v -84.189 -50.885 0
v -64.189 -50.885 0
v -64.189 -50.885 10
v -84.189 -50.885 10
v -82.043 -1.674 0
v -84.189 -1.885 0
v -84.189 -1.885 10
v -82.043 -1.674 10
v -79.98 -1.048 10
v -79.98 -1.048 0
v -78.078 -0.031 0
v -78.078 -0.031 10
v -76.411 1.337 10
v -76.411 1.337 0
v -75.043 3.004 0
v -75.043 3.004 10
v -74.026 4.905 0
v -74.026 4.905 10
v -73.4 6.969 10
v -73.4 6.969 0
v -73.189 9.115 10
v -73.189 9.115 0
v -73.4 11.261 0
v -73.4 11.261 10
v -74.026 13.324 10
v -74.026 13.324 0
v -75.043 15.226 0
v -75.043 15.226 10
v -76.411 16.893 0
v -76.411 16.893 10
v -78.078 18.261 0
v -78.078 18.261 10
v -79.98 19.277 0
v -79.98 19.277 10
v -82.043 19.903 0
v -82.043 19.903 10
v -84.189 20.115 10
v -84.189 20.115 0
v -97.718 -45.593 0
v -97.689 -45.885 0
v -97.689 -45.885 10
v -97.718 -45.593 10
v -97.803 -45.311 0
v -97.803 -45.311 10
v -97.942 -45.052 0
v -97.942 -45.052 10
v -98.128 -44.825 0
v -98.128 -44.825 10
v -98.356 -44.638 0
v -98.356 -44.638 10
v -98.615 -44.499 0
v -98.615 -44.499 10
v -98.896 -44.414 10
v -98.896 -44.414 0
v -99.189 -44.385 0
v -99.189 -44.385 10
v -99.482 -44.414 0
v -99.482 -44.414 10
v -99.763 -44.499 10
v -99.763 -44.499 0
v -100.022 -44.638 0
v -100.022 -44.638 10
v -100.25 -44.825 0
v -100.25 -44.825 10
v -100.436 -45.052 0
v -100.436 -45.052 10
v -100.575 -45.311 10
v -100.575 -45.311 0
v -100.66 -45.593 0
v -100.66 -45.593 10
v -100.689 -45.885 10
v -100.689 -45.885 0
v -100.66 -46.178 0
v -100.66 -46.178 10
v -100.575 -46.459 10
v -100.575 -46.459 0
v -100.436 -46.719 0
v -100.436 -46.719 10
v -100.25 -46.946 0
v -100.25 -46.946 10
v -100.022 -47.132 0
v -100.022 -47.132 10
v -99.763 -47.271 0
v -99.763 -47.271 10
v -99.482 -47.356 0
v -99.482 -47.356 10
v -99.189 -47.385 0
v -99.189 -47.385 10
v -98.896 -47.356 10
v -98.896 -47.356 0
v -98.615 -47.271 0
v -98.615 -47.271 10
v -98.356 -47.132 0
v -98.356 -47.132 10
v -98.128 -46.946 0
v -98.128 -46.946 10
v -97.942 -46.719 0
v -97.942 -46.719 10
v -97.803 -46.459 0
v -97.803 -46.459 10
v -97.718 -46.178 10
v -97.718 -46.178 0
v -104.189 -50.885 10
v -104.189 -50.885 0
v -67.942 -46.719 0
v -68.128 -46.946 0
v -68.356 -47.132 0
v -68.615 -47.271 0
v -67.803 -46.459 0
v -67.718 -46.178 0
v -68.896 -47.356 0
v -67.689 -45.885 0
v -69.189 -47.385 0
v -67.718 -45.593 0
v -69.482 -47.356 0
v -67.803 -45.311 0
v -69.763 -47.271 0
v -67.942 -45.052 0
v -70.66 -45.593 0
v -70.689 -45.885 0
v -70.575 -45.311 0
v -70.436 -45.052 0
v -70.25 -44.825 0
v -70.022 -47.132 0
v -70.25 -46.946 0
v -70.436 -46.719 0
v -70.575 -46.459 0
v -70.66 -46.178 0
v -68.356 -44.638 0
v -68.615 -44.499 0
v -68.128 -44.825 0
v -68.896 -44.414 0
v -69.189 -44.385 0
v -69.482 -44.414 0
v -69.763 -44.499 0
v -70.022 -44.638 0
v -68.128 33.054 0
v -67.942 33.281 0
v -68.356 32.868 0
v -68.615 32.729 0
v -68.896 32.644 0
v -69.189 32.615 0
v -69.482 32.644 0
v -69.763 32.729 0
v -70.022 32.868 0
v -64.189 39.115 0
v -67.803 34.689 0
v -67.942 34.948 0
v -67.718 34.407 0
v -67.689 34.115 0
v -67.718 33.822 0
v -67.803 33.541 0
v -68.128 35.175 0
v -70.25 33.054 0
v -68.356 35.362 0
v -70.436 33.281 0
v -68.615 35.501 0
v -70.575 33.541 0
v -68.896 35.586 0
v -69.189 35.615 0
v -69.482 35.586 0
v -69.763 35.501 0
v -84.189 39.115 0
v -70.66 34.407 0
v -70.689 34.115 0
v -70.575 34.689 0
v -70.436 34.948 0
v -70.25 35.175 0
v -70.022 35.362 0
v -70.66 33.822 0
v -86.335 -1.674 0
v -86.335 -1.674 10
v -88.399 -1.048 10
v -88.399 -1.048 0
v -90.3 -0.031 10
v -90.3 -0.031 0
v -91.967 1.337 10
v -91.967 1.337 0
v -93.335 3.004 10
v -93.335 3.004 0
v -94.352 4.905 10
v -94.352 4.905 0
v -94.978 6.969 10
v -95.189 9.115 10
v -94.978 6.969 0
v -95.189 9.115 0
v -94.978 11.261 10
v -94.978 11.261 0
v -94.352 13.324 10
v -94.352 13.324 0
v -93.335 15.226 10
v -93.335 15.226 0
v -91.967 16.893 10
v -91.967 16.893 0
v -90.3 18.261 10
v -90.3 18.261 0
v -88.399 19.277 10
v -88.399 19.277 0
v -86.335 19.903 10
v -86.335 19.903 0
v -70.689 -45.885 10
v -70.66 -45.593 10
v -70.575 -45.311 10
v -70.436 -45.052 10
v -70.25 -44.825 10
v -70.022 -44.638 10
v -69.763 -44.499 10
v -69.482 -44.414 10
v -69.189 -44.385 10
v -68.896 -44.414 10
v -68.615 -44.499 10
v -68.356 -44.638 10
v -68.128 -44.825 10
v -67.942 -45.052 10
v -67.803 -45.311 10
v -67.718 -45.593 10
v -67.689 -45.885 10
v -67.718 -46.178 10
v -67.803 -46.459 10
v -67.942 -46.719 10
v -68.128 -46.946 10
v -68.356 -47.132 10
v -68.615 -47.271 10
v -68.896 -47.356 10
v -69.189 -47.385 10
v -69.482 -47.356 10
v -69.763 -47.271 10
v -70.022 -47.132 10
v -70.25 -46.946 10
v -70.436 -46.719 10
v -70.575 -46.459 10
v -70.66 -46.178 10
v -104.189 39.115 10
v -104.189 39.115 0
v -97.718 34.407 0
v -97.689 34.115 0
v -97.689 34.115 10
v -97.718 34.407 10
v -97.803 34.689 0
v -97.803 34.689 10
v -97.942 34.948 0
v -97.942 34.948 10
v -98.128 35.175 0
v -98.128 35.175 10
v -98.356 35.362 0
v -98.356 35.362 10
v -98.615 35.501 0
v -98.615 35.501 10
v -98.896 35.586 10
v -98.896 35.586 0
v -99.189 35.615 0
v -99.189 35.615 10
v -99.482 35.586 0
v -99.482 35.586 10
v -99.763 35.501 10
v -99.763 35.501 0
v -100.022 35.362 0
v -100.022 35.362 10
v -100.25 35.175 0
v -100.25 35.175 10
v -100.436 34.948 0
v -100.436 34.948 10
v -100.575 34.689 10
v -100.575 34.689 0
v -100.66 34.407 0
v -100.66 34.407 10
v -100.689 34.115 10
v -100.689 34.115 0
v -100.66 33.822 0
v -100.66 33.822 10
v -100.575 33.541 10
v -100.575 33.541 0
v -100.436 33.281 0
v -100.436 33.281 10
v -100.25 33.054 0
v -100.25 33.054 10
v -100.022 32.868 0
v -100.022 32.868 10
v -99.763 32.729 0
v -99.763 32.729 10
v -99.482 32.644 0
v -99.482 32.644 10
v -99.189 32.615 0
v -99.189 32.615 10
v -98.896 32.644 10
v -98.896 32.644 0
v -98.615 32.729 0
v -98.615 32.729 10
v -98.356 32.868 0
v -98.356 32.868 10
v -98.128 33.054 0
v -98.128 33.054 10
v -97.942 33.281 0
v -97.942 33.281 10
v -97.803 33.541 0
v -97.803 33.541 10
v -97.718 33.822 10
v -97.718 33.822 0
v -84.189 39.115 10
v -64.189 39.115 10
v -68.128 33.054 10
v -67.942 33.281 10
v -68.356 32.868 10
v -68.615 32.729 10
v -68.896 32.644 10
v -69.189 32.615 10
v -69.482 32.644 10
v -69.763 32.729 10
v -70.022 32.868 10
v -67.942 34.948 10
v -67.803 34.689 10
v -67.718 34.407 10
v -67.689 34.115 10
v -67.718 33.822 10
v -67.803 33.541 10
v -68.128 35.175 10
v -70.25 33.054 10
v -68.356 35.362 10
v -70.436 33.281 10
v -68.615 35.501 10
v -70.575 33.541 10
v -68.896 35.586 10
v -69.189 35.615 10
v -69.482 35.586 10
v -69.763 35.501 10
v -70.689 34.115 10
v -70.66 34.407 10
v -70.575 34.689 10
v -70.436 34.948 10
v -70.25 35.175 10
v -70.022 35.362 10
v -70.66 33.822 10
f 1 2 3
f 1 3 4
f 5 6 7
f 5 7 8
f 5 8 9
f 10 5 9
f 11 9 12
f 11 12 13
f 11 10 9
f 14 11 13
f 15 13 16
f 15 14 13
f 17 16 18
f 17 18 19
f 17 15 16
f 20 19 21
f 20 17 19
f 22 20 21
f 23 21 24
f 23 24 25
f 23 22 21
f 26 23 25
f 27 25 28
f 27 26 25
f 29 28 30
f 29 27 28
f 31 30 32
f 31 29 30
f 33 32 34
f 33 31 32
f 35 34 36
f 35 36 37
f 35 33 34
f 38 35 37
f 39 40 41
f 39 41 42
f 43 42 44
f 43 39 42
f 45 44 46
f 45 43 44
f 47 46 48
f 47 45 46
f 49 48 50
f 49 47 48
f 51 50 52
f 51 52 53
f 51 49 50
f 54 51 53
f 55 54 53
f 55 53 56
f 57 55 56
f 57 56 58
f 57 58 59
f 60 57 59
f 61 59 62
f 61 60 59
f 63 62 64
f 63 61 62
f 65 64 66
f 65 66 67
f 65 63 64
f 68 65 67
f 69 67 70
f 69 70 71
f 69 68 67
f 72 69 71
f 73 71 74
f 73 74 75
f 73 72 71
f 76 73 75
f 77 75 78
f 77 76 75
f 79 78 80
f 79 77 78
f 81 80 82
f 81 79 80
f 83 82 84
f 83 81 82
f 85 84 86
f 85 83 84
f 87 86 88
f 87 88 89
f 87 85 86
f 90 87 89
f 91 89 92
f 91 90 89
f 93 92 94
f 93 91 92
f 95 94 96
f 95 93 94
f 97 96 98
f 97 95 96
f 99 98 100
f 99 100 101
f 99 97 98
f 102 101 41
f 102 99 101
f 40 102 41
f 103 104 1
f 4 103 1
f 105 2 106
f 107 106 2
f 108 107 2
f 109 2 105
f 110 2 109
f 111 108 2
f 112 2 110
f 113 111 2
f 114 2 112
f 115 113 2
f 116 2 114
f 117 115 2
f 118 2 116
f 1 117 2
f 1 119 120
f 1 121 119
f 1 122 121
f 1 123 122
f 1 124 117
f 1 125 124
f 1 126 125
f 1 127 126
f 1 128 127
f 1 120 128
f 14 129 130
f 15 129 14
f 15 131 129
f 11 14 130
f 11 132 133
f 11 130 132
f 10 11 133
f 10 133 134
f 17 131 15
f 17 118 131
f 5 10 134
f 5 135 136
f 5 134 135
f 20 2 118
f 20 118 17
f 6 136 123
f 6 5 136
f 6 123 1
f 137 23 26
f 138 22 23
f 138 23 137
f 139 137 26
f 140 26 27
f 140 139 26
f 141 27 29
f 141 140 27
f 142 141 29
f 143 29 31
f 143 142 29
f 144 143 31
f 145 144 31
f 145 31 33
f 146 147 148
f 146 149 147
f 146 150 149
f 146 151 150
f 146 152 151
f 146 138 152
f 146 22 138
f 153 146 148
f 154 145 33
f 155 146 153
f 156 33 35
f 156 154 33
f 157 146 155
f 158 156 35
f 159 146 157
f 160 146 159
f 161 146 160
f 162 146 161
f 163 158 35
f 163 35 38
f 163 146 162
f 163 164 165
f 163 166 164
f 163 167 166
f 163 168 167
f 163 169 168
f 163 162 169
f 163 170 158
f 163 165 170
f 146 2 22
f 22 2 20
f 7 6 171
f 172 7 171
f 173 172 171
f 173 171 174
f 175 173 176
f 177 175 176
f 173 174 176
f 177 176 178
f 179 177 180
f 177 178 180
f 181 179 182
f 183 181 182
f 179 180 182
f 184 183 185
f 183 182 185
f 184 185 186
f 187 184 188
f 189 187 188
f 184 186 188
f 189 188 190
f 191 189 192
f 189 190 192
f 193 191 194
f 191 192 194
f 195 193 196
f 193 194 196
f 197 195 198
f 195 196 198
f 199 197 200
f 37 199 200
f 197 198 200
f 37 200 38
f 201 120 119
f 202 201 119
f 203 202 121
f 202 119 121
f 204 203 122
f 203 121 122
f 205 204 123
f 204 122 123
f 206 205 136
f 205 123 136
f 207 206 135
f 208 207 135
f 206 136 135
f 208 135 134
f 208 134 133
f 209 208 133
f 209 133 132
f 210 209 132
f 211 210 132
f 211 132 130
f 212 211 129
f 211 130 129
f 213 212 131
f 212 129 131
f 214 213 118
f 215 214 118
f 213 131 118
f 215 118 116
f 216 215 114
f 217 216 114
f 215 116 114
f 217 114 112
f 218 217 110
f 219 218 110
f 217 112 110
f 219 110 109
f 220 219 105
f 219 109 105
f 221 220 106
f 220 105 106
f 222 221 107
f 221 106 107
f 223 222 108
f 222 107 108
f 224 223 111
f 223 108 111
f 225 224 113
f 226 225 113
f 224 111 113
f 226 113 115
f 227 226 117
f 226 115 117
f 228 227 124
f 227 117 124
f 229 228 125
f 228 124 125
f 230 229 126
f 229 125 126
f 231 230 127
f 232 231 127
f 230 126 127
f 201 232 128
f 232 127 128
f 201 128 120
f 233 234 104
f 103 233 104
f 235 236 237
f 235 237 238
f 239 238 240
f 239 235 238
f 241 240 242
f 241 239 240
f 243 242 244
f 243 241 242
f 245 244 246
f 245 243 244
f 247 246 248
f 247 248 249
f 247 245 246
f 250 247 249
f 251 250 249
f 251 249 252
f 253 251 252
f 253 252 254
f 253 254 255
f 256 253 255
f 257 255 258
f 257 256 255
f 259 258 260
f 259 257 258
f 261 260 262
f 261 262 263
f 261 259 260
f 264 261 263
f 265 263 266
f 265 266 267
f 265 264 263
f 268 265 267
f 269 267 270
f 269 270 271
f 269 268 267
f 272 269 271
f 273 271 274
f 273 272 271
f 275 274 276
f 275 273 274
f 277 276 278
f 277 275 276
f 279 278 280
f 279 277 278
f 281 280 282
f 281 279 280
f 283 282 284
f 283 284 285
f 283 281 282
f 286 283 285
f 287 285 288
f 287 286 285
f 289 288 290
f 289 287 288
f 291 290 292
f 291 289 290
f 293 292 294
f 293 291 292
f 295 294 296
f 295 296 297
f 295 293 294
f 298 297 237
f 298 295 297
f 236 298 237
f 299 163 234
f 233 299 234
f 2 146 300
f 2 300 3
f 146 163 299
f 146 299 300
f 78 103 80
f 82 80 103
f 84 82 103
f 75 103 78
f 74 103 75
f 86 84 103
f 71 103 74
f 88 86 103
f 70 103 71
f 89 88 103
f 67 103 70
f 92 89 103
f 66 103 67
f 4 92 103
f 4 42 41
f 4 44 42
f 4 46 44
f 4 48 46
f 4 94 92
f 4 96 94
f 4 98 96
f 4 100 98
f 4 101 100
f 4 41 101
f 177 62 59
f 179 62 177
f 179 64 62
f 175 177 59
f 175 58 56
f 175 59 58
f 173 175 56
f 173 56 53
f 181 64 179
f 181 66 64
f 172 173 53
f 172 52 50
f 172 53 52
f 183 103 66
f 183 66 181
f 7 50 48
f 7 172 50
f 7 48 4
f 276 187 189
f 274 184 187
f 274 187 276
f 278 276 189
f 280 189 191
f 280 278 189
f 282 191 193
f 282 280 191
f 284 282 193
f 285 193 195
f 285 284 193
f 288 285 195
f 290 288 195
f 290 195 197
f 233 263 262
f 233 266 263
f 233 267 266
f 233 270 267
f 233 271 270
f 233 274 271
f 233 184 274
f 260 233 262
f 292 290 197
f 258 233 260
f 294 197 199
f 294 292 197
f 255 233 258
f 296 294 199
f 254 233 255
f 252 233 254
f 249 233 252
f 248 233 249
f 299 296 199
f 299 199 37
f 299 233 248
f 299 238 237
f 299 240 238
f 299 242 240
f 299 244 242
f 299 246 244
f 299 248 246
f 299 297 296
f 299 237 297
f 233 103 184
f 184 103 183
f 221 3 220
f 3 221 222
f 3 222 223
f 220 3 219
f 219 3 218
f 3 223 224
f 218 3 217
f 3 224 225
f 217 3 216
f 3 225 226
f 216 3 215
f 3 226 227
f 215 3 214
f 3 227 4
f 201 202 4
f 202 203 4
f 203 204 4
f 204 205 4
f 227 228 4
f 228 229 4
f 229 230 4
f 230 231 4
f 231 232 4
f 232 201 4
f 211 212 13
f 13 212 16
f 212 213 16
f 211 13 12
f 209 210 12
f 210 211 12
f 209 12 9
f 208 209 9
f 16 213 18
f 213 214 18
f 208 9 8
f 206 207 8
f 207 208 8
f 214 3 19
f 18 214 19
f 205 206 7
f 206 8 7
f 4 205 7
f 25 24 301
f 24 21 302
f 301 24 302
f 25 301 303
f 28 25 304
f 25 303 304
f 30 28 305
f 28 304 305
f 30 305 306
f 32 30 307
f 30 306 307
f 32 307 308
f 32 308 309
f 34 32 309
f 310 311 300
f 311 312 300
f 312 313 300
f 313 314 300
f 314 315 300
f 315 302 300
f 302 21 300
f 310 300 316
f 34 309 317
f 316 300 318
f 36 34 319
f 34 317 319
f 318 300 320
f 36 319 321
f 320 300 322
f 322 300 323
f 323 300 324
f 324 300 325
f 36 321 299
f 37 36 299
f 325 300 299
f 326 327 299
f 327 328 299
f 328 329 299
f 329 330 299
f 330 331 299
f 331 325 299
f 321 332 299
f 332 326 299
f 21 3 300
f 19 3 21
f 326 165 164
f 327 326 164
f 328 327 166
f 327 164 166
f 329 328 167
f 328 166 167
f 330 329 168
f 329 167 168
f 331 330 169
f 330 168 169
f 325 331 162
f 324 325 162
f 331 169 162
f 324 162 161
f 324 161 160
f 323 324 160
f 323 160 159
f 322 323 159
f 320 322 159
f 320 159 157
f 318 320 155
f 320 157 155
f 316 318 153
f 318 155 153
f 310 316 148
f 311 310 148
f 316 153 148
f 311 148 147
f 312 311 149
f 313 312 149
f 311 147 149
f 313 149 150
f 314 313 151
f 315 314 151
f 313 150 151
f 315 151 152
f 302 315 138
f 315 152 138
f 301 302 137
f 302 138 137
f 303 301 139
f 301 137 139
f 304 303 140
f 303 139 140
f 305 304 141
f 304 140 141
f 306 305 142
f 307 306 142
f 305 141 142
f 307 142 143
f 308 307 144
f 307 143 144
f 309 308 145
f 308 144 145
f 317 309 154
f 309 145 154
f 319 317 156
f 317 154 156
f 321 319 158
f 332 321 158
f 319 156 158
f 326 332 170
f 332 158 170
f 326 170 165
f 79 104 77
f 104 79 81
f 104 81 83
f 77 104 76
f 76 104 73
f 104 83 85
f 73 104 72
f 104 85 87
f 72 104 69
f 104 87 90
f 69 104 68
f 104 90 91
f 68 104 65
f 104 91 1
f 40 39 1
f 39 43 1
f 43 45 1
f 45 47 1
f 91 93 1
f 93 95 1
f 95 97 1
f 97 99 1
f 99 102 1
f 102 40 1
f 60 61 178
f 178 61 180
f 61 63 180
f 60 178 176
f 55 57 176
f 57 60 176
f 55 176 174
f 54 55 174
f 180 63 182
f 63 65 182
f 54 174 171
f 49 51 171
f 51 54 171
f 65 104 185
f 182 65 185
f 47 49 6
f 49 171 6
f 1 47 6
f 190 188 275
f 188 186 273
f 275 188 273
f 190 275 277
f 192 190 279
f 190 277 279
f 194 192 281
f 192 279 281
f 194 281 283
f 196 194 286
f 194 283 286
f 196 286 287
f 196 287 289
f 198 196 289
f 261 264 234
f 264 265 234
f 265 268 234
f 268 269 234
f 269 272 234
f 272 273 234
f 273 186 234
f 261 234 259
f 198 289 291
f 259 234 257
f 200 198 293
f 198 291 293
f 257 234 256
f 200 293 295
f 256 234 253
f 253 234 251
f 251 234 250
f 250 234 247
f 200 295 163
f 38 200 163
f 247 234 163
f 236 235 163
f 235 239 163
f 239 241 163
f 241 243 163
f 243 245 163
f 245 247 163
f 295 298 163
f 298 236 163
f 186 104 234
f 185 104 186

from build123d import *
from build123d.topology import SkipClean

# Parameters (mm, degrees)
SKETCH1_R           = 1.5
BOSS_EXTRUDE1_DEPTH = 10


with BuildPart() as part:
    # Sketch1 → Boss-Extrude1 (new body)
    with BuildSketch(Plane.XY):
        with BuildLine():
            Line((-104.189078903, 39.114814762), (-104.189078903, -50.885185238))
            Line((-104.189078903, -50.885185238), (-84.189078903, -50.885185238))
            Line((-84.189078903, -50.885185238), (-84.189078903, -1.885185238))
            ThreePointArc((-84.189078903, -1.885185238), (-95.189078903, 9.114814762), (-84.189078903, 20.114814762))
            Line((-84.189078903, 20.114814762), (-84.189078903, 39.114814762))
            Line((-84.189078903, 39.114814762), (-104.189078903, 39.114814762))
        make_face()
        with Locations((-99.189078903, -45.885185238)):
            Circle(SKETCH1_R, mode=Mode.SUBTRACT)
        with Locations((-99.189078903, 34.114814762)):
            Circle(SKETCH1_R, mode=Mode.SUBTRACT)
    boss_extrude1 = extrude(amount=BOSS_EXTRUDE1_DEPTH)

    # Mirror1: Boss-Extrude1 across plane
    with SkipClean():  # the faces are left unmerged after this step: merging them gives an invalid solid
        add(boss_extrude1.mirror(Plane(origin=(-84.189078903, 0, 10), x_dir=(0, 0, 1), z_dir=(1, 0, 0))))


solid = part.part
